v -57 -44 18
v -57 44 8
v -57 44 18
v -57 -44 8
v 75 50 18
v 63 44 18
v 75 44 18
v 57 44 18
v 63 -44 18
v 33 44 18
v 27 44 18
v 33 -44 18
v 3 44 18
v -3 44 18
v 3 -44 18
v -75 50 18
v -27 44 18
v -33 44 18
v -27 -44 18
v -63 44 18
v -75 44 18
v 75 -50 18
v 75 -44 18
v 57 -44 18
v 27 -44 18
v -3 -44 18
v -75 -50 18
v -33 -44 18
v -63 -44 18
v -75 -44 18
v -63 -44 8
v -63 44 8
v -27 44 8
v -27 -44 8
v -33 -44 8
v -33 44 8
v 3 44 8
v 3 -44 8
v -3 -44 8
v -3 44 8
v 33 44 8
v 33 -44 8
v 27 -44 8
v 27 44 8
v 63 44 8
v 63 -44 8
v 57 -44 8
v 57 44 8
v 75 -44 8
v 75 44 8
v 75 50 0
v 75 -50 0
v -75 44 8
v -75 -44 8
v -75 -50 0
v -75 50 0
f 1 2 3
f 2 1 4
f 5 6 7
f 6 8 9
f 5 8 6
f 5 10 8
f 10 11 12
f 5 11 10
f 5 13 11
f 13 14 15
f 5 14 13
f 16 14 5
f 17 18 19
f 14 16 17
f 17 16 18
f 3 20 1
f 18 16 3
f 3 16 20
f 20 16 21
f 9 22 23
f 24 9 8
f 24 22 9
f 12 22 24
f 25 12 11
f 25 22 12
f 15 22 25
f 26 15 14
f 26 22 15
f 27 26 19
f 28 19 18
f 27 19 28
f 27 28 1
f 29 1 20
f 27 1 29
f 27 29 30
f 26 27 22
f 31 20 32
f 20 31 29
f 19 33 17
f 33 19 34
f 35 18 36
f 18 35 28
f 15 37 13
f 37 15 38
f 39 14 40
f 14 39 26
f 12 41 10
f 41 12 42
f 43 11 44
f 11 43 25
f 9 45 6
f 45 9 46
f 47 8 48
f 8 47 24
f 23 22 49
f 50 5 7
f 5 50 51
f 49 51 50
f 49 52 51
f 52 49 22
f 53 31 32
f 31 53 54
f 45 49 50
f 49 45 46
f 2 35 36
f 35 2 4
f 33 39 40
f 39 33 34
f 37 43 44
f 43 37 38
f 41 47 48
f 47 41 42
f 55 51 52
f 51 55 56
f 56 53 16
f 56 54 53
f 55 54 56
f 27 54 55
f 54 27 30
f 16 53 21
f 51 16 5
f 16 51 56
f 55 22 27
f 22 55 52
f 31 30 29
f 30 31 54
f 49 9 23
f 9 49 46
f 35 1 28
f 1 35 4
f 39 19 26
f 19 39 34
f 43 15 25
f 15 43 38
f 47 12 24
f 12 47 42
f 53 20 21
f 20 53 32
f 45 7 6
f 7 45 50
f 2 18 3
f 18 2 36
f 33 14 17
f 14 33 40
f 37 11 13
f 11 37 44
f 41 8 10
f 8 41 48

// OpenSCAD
$fn = 32;

// ----------------------------------------------------------------------
// Rib frame 150 x 100 x 18
// 5 ribs at 30 mm pitch
// ----------------------------------------------------------------------

// --- parameters (mm) ---
frame = [150, 100, 8];  // base plate size (x, y, z)
rail_w = 6;             // side rail width
ribs = 5;               // number of ribs
rib_t = 6;              // rib thickness
rib_h = 10;             // rib height above the base plate
pitch = 30;             // pitch between rib centres

// --- derived feature positions (mm) ---
span = (ribs - 1) * pitch;          // = 120   distance between the outer ribs
origin_x = -span / 2;               // = -60   X of the first rib
rib_len = frame[1] - 2 * rail_w + 2;  // = 90   rib length, 1 mm into each rail
feature_centers = [
  [origin_x + 0 * pitch, 0],
  [origin_x + 1 * pitch, 0],
  [origin_x + 2 * pitch, 0],
  [origin_x + 3 * pitch, 0],
  [origin_x + 4 * pitch, 0]
];   // rib centre line, drives the rib loop

// base plate, two side rails, then the ribs read straight off feature_centers
union() {
  translate([-frame[0] / 2, -frame[1] / 2, 0]) cube(frame);
  translate([-frame[0] / 2, -frame[1] / 2, 0]) cube([frame[0], rail_w, frame[2] + rib_h]);
  translate([-frame[0] / 2, frame[1] / 2 - rail_w, 0]) cube([frame[0], rail_w, frame[2] + rib_h]);
  for (centre = feature_centers)
    translate([centre[0] - rib_t / 2, centre[1] - rib_len / 2, frame[2] - 1])
      cube([rib_t, rib_len, rib_h + 1]);
}
